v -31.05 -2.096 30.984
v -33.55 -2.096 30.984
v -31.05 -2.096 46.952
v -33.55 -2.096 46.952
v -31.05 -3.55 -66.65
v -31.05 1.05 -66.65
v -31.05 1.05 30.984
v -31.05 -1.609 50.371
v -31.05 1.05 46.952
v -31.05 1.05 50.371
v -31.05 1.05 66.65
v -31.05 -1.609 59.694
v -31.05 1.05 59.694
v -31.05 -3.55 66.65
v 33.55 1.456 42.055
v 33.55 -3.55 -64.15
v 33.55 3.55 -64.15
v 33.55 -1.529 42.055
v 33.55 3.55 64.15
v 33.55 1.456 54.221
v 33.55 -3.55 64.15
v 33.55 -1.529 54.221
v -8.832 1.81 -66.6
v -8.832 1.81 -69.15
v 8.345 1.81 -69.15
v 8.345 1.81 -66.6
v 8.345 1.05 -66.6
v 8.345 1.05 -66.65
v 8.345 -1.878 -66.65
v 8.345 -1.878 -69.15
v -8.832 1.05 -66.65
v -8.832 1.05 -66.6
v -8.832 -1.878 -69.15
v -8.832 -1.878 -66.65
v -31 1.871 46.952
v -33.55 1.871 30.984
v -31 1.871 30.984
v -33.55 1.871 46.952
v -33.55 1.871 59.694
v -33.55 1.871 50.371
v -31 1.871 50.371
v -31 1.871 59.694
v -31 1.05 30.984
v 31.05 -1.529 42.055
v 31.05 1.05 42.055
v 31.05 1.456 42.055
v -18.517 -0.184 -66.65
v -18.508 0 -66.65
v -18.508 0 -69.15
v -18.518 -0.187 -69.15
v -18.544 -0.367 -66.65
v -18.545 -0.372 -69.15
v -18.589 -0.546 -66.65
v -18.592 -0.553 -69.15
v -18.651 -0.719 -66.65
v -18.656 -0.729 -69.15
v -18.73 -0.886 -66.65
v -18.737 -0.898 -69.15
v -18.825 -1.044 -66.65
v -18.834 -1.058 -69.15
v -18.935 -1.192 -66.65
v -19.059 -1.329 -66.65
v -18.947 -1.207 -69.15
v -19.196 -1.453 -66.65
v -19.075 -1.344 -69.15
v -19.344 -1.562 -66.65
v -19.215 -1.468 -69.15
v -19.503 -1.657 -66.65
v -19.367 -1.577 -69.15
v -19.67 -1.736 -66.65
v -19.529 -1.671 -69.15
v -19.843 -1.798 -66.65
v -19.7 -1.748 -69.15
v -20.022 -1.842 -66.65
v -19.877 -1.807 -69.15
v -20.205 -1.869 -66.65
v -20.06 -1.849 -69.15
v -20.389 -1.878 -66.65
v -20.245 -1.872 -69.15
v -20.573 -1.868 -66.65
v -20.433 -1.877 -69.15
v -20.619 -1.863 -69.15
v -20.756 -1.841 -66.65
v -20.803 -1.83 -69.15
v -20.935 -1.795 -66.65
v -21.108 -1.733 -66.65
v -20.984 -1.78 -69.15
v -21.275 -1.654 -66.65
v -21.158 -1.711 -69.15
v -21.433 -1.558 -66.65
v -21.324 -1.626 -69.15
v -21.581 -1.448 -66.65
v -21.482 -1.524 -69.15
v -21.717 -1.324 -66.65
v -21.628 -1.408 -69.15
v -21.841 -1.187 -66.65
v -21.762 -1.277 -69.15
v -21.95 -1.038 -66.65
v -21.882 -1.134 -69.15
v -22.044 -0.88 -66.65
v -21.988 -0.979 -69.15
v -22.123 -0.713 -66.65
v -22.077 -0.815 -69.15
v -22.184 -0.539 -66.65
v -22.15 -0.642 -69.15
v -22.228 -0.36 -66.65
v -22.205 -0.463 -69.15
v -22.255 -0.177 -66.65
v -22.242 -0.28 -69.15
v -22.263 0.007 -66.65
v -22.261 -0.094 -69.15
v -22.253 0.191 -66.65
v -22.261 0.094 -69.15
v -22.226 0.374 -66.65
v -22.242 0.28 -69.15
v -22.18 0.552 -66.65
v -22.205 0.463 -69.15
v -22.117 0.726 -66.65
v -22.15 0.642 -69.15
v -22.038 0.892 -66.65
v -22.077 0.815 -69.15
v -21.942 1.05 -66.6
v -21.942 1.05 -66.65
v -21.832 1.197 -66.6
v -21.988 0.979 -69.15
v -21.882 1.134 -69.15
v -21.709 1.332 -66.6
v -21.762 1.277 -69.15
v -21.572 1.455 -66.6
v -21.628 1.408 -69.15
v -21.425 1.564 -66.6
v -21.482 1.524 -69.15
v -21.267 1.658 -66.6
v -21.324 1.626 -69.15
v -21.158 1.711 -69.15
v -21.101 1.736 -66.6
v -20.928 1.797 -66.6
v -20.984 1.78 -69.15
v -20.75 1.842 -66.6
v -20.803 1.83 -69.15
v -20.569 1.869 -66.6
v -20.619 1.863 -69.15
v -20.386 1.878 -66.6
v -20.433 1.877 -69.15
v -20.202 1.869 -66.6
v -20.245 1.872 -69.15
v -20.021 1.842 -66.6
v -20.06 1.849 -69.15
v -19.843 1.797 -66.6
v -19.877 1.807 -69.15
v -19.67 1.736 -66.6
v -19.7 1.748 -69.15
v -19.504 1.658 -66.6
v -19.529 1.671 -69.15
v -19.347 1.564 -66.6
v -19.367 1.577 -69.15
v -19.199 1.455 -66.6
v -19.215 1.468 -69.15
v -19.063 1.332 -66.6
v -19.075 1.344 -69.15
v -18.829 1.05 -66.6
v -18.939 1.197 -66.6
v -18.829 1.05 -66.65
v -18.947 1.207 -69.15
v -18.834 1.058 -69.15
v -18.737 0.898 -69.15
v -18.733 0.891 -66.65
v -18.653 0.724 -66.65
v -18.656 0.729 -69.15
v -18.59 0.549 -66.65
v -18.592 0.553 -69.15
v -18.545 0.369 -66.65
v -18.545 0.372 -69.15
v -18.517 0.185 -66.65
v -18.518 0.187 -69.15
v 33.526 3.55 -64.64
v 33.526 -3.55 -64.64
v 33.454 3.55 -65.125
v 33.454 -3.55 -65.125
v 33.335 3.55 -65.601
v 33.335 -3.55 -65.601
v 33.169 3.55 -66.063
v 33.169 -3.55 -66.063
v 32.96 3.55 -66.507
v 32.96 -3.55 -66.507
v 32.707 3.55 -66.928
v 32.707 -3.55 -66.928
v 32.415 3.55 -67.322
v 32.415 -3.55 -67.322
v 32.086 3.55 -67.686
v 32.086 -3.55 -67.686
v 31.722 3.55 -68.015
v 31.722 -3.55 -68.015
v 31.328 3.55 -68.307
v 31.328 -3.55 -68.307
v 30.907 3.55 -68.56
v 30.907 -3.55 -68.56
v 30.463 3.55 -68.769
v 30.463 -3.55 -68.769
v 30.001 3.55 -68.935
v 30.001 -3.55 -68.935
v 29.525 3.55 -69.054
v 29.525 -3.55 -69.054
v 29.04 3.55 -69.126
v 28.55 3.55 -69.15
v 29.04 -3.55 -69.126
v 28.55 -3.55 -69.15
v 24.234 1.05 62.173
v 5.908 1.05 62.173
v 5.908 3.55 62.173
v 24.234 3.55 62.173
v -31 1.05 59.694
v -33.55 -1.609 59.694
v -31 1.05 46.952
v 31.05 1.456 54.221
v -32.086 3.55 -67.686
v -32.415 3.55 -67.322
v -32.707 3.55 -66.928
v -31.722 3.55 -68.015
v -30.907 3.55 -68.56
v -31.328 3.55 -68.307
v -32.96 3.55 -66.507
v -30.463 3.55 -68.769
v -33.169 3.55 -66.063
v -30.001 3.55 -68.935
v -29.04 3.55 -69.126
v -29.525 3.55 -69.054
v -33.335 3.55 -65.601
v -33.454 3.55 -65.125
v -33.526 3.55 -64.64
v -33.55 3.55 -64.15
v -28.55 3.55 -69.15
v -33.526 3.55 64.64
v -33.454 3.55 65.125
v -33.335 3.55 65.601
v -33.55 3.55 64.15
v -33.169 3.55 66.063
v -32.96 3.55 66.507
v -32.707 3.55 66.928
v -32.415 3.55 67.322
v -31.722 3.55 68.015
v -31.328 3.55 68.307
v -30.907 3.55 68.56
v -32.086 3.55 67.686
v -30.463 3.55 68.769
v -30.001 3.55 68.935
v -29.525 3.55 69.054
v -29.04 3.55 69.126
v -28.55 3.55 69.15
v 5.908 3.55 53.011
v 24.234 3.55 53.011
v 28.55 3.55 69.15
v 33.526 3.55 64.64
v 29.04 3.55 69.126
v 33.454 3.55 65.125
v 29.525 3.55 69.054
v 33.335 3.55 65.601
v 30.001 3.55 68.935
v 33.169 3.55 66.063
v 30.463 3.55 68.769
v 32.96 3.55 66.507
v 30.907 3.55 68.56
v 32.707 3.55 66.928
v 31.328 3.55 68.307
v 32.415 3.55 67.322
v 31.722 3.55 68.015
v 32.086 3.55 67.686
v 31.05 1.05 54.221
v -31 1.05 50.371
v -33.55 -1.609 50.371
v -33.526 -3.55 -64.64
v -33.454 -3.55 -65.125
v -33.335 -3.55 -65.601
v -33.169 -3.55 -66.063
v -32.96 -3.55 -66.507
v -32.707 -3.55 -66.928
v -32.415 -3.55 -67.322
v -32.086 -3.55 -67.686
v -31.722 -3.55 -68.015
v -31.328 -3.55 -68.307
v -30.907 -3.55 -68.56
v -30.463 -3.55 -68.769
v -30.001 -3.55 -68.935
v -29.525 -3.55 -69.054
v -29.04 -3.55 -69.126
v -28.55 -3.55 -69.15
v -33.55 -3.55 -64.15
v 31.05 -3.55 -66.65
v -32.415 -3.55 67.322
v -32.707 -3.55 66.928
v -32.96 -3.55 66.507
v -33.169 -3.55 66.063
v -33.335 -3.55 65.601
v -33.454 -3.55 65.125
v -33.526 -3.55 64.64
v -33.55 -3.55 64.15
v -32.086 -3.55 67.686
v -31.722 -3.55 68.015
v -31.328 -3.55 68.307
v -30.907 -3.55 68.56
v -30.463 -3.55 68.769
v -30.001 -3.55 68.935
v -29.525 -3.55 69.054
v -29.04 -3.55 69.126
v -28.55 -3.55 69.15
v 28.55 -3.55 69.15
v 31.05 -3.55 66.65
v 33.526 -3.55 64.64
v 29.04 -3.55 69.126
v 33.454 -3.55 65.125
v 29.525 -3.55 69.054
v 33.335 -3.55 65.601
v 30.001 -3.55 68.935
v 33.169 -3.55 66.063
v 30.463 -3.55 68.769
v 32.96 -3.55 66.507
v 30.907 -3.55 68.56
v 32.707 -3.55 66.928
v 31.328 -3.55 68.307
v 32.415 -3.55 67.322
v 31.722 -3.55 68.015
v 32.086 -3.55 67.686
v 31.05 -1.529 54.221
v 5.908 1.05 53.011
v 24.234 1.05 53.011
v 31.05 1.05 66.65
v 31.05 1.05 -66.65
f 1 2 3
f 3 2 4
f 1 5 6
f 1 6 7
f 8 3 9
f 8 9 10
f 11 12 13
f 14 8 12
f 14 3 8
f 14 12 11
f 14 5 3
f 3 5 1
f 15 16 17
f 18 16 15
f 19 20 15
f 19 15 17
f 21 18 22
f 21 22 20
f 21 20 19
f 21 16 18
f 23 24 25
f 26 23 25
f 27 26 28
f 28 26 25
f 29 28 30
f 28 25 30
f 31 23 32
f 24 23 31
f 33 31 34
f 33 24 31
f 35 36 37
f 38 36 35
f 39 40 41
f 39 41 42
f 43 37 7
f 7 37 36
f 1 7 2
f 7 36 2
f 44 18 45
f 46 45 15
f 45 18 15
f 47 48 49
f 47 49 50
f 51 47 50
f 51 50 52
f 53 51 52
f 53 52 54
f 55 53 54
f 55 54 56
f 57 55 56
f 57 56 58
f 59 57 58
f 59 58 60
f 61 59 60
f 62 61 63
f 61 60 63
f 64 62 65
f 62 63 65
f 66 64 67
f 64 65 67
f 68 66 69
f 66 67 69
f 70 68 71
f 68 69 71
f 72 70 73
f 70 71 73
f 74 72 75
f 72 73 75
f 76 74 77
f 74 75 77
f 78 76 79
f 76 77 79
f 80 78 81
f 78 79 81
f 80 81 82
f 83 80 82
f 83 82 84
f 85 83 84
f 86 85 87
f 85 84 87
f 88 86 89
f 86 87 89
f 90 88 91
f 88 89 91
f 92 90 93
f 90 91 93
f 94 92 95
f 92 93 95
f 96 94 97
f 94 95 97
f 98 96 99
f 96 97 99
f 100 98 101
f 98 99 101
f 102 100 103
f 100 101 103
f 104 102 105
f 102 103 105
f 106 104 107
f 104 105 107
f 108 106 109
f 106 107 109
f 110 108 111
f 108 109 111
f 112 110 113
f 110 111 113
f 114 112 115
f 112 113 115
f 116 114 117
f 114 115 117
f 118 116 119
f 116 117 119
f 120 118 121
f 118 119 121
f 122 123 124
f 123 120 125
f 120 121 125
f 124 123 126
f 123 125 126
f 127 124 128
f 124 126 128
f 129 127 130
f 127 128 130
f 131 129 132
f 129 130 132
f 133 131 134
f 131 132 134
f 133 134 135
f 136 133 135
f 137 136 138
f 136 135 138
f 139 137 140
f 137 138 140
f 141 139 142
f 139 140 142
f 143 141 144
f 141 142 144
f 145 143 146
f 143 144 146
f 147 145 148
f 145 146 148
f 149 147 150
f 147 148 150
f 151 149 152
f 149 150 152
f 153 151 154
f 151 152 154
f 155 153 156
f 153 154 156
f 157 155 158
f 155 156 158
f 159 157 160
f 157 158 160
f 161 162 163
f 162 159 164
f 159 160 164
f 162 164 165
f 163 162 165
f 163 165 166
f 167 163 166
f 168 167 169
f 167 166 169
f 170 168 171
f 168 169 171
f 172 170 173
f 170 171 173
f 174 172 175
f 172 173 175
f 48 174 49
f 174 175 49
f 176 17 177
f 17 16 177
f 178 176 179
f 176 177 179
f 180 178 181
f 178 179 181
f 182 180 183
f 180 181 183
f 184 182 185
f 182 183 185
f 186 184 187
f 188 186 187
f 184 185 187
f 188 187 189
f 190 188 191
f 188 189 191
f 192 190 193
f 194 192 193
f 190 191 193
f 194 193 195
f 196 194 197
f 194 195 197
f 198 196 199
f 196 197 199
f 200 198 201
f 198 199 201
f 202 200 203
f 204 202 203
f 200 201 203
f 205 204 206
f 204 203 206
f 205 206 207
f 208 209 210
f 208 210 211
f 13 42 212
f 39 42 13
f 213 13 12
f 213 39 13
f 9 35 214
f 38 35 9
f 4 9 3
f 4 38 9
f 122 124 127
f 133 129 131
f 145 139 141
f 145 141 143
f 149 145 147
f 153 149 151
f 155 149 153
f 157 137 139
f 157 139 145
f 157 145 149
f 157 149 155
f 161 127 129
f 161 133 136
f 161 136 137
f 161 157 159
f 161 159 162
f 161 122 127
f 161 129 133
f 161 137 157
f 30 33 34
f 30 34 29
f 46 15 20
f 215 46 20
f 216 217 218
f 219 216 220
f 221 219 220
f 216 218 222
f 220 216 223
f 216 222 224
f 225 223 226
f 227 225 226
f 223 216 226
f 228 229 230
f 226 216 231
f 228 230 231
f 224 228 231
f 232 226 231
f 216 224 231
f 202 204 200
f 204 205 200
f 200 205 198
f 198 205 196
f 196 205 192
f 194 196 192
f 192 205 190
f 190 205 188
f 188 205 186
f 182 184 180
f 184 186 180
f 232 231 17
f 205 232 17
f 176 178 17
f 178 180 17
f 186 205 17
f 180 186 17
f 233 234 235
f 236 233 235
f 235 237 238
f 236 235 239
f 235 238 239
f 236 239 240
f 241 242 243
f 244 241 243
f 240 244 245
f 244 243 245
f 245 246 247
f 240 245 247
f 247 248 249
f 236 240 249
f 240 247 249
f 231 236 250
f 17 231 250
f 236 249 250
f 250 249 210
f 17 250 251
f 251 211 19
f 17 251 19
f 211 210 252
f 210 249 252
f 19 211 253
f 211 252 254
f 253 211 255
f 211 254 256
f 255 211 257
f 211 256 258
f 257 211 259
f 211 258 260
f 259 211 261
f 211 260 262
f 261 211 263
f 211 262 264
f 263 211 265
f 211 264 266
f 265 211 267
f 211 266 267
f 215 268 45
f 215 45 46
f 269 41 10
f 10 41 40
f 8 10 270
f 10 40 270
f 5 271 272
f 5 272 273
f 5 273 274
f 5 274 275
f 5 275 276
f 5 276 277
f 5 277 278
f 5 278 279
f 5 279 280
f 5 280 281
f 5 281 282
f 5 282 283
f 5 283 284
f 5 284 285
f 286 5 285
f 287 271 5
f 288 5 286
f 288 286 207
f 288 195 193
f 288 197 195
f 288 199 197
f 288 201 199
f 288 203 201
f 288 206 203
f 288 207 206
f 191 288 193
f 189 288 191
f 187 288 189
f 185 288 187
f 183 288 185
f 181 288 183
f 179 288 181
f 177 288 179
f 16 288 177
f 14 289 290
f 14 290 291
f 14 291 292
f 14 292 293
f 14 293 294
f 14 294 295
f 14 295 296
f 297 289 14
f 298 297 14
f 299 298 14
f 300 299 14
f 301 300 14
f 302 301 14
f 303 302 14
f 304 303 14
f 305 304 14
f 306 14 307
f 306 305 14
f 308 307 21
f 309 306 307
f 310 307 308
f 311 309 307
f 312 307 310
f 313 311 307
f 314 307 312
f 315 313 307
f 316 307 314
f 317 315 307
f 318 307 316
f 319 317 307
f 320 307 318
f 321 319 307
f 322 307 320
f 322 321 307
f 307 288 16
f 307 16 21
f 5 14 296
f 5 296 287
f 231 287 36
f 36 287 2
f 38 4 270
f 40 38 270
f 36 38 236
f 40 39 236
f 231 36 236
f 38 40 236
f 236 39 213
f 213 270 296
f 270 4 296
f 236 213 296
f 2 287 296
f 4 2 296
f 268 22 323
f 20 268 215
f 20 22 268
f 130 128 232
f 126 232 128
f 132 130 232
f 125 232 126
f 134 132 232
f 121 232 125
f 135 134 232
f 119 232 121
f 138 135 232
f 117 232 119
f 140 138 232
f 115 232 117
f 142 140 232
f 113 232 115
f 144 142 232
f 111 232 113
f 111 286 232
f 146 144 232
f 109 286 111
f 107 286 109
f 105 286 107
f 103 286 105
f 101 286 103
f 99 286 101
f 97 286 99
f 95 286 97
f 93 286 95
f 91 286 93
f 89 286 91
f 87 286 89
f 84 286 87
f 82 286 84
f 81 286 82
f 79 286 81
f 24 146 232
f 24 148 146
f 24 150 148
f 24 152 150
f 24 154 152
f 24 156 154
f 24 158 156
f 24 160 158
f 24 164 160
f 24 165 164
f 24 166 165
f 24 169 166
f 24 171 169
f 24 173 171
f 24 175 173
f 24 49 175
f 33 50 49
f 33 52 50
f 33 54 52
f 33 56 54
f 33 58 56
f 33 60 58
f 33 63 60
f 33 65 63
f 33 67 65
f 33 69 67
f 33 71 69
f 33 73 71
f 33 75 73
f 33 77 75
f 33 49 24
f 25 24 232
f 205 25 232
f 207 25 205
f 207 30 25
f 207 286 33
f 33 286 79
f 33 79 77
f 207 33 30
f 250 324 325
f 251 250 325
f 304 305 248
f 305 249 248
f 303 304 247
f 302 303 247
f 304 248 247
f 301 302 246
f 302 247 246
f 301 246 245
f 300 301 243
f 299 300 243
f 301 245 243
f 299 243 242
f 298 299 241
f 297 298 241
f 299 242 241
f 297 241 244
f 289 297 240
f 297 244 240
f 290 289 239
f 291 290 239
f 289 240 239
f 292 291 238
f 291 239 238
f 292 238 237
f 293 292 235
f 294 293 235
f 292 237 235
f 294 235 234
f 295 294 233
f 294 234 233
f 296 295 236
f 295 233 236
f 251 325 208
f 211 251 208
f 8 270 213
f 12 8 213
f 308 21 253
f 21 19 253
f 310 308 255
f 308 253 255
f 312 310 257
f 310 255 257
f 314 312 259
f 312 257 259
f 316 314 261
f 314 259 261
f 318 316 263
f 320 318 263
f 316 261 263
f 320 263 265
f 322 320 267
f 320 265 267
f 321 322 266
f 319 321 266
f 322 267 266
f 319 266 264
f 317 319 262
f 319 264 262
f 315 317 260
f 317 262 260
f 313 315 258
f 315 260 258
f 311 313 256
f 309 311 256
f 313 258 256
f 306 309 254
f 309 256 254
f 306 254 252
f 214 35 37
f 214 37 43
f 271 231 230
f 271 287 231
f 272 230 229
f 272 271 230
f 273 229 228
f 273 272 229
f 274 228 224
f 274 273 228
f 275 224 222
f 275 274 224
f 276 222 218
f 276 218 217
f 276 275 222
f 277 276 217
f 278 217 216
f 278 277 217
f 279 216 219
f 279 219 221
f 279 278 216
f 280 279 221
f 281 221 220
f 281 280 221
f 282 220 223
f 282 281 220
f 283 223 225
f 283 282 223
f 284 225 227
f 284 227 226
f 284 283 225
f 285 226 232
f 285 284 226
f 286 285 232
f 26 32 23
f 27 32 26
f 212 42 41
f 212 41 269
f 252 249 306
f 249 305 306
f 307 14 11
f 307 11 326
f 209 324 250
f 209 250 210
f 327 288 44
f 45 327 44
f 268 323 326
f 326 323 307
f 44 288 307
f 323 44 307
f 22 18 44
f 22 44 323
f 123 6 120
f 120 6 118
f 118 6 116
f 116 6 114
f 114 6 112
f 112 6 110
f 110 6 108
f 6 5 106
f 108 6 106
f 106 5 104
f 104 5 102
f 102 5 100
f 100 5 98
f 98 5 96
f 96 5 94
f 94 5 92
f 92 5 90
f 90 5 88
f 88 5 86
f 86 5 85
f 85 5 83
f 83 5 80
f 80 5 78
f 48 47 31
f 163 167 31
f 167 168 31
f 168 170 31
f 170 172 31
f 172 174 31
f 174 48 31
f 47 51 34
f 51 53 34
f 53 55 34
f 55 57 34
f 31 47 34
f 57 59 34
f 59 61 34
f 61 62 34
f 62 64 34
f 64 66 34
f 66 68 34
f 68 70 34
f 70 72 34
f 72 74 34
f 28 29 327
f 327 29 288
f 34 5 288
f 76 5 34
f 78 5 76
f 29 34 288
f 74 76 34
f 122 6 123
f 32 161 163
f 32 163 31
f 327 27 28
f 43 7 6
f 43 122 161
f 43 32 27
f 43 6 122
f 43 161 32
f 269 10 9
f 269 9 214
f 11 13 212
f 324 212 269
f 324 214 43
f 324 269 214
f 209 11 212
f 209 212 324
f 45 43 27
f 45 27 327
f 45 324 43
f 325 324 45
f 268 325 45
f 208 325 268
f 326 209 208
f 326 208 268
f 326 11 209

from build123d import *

# Parameters (mm, degrees)
F0_W      = 67.1
F0_H      = 138.3
F1_DEPTH  = 3.55
F2_T      = -2.5
F3_R      = 5
F4_W      = 18.3261586353
F4_H      = 9.162325412
F5_DEPTH  = 12.5
F6_W      = 17.1764912084
F6_H      = 3.6870999029
F7_DEPTH  = 2.55
F8_W      = 3.479784471
F8_H      = 9.3234963715
F9_DEPTH  = 2.55
F10_W     = 3.967121942
F10_H     = 15.9676056355
F11_DEPTH = 2.55
F12_R     = 1.8775227945
F13_DEPTH = 2.55
F17_W     = 2.9842249351
F17_H     = 12.1664553881
F18_DEPTH = 2.5


# Not quite as in the source:
# - the program builds the solid bodies; features that only make, move or delete a surface that nothing else refers to are left out


with BuildPart() as f1:
    # F0 (on Front) → F1 (new body, symmetric)
    with BuildSketch(Plane.XZ):
        Rectangle(F0_W, F0_H)
    extrude(amount=F1_DEPTH, both=True)

    # F2
    f2_openings = [f1.faces().sort_by_distance(p)[0] for p in [
        (0, -3.55, 0),
    ]]
    offset(amount=F2_T, openings=f2_openings)

    # F3
    f3_edges = [f1.edges().sort_by_distance(p)[0] for p in [
        (-33.55, 0, 69.15),
        (33.55, 0, 69.15),
        (-33.55, 0, -69.15),
        (33.55, 0, -69.15),
    ]]
    fillet(f3_edges, radius=F3_R)

    # F4 (on Front) → F5 (cut, symmetric)
    with BuildSketch(Plane.XZ):
        with Locations((15.0705915876, 57.5918015093)):
            Rectangle(F4_W, F4_H)
    extrude(amount=F5_DEPTH, both=True, mode=Mode.SUBTRACT)

    # F6 (on face) → F7 (cut, symmetric)
    with BuildSketch(Plane(origin=(0, 0, -69.15), x_dir=(1, 0, 0), z_dir=(0, 0, -1))):
        with Locations((-0.2433923073, 0.0339728431)):
            Rectangle(F6_W, F6_H)
    extrude(amount=F7_DEPTH, both=True, mode=Mode.SUBTRACT)

    # F8 (on face) → F9 (cut, symmetric)
    with BuildSketch(Plane(origin=(-33.55, 0, 0), x_dir=(0, -1, 0), z_dir=(-1, 0, 0))):
        with Locations((-0.1312090899, 55.0323408097)):
            Rectangle(F8_W, F8_H)
    extrude(amount=F9_DEPTH, both=True, mode=Mode.SUBTRACT)

    # F10 (on face) → F11 (cut, symmetric)
    with BuildSketch(Plane(origin=(-33.55, 0, 0), x_dir=(0, -1, 0), z_dir=(-1, 0, 0))):
        with Locations((0.1124596456, 38.9681095257)):
            Rectangle(F10_W, F10_H)
    extrude(amount=F11_DEPTH, both=True, mode=Mode.SUBTRACT)

    # F12 (on face) → F13 (cut, symmetric)
    with BuildSketch(Plane(origin=(0, 0, -69.15), x_dir=(1, 0, 0), z_dir=(0, 0, -1))):
        with Locations((-20.385697484, 0)):
            Circle(F12_R)
    extrude(amount=F13_DEPTH, both=True, mode=Mode.SUBTRACT)

    # F17 (on face) → F18 (cut, symmetric)
    with BuildSketch(Plane.YZ.offset(33.55)):
        with Locations((-0.036496378, 48.1377318501)):
            Rectangle(F17_W, F17_H)
    extrude(amount=F18_DEPTH, both=True, mode=Mode.SUBTRACT)


solid = f1.part
